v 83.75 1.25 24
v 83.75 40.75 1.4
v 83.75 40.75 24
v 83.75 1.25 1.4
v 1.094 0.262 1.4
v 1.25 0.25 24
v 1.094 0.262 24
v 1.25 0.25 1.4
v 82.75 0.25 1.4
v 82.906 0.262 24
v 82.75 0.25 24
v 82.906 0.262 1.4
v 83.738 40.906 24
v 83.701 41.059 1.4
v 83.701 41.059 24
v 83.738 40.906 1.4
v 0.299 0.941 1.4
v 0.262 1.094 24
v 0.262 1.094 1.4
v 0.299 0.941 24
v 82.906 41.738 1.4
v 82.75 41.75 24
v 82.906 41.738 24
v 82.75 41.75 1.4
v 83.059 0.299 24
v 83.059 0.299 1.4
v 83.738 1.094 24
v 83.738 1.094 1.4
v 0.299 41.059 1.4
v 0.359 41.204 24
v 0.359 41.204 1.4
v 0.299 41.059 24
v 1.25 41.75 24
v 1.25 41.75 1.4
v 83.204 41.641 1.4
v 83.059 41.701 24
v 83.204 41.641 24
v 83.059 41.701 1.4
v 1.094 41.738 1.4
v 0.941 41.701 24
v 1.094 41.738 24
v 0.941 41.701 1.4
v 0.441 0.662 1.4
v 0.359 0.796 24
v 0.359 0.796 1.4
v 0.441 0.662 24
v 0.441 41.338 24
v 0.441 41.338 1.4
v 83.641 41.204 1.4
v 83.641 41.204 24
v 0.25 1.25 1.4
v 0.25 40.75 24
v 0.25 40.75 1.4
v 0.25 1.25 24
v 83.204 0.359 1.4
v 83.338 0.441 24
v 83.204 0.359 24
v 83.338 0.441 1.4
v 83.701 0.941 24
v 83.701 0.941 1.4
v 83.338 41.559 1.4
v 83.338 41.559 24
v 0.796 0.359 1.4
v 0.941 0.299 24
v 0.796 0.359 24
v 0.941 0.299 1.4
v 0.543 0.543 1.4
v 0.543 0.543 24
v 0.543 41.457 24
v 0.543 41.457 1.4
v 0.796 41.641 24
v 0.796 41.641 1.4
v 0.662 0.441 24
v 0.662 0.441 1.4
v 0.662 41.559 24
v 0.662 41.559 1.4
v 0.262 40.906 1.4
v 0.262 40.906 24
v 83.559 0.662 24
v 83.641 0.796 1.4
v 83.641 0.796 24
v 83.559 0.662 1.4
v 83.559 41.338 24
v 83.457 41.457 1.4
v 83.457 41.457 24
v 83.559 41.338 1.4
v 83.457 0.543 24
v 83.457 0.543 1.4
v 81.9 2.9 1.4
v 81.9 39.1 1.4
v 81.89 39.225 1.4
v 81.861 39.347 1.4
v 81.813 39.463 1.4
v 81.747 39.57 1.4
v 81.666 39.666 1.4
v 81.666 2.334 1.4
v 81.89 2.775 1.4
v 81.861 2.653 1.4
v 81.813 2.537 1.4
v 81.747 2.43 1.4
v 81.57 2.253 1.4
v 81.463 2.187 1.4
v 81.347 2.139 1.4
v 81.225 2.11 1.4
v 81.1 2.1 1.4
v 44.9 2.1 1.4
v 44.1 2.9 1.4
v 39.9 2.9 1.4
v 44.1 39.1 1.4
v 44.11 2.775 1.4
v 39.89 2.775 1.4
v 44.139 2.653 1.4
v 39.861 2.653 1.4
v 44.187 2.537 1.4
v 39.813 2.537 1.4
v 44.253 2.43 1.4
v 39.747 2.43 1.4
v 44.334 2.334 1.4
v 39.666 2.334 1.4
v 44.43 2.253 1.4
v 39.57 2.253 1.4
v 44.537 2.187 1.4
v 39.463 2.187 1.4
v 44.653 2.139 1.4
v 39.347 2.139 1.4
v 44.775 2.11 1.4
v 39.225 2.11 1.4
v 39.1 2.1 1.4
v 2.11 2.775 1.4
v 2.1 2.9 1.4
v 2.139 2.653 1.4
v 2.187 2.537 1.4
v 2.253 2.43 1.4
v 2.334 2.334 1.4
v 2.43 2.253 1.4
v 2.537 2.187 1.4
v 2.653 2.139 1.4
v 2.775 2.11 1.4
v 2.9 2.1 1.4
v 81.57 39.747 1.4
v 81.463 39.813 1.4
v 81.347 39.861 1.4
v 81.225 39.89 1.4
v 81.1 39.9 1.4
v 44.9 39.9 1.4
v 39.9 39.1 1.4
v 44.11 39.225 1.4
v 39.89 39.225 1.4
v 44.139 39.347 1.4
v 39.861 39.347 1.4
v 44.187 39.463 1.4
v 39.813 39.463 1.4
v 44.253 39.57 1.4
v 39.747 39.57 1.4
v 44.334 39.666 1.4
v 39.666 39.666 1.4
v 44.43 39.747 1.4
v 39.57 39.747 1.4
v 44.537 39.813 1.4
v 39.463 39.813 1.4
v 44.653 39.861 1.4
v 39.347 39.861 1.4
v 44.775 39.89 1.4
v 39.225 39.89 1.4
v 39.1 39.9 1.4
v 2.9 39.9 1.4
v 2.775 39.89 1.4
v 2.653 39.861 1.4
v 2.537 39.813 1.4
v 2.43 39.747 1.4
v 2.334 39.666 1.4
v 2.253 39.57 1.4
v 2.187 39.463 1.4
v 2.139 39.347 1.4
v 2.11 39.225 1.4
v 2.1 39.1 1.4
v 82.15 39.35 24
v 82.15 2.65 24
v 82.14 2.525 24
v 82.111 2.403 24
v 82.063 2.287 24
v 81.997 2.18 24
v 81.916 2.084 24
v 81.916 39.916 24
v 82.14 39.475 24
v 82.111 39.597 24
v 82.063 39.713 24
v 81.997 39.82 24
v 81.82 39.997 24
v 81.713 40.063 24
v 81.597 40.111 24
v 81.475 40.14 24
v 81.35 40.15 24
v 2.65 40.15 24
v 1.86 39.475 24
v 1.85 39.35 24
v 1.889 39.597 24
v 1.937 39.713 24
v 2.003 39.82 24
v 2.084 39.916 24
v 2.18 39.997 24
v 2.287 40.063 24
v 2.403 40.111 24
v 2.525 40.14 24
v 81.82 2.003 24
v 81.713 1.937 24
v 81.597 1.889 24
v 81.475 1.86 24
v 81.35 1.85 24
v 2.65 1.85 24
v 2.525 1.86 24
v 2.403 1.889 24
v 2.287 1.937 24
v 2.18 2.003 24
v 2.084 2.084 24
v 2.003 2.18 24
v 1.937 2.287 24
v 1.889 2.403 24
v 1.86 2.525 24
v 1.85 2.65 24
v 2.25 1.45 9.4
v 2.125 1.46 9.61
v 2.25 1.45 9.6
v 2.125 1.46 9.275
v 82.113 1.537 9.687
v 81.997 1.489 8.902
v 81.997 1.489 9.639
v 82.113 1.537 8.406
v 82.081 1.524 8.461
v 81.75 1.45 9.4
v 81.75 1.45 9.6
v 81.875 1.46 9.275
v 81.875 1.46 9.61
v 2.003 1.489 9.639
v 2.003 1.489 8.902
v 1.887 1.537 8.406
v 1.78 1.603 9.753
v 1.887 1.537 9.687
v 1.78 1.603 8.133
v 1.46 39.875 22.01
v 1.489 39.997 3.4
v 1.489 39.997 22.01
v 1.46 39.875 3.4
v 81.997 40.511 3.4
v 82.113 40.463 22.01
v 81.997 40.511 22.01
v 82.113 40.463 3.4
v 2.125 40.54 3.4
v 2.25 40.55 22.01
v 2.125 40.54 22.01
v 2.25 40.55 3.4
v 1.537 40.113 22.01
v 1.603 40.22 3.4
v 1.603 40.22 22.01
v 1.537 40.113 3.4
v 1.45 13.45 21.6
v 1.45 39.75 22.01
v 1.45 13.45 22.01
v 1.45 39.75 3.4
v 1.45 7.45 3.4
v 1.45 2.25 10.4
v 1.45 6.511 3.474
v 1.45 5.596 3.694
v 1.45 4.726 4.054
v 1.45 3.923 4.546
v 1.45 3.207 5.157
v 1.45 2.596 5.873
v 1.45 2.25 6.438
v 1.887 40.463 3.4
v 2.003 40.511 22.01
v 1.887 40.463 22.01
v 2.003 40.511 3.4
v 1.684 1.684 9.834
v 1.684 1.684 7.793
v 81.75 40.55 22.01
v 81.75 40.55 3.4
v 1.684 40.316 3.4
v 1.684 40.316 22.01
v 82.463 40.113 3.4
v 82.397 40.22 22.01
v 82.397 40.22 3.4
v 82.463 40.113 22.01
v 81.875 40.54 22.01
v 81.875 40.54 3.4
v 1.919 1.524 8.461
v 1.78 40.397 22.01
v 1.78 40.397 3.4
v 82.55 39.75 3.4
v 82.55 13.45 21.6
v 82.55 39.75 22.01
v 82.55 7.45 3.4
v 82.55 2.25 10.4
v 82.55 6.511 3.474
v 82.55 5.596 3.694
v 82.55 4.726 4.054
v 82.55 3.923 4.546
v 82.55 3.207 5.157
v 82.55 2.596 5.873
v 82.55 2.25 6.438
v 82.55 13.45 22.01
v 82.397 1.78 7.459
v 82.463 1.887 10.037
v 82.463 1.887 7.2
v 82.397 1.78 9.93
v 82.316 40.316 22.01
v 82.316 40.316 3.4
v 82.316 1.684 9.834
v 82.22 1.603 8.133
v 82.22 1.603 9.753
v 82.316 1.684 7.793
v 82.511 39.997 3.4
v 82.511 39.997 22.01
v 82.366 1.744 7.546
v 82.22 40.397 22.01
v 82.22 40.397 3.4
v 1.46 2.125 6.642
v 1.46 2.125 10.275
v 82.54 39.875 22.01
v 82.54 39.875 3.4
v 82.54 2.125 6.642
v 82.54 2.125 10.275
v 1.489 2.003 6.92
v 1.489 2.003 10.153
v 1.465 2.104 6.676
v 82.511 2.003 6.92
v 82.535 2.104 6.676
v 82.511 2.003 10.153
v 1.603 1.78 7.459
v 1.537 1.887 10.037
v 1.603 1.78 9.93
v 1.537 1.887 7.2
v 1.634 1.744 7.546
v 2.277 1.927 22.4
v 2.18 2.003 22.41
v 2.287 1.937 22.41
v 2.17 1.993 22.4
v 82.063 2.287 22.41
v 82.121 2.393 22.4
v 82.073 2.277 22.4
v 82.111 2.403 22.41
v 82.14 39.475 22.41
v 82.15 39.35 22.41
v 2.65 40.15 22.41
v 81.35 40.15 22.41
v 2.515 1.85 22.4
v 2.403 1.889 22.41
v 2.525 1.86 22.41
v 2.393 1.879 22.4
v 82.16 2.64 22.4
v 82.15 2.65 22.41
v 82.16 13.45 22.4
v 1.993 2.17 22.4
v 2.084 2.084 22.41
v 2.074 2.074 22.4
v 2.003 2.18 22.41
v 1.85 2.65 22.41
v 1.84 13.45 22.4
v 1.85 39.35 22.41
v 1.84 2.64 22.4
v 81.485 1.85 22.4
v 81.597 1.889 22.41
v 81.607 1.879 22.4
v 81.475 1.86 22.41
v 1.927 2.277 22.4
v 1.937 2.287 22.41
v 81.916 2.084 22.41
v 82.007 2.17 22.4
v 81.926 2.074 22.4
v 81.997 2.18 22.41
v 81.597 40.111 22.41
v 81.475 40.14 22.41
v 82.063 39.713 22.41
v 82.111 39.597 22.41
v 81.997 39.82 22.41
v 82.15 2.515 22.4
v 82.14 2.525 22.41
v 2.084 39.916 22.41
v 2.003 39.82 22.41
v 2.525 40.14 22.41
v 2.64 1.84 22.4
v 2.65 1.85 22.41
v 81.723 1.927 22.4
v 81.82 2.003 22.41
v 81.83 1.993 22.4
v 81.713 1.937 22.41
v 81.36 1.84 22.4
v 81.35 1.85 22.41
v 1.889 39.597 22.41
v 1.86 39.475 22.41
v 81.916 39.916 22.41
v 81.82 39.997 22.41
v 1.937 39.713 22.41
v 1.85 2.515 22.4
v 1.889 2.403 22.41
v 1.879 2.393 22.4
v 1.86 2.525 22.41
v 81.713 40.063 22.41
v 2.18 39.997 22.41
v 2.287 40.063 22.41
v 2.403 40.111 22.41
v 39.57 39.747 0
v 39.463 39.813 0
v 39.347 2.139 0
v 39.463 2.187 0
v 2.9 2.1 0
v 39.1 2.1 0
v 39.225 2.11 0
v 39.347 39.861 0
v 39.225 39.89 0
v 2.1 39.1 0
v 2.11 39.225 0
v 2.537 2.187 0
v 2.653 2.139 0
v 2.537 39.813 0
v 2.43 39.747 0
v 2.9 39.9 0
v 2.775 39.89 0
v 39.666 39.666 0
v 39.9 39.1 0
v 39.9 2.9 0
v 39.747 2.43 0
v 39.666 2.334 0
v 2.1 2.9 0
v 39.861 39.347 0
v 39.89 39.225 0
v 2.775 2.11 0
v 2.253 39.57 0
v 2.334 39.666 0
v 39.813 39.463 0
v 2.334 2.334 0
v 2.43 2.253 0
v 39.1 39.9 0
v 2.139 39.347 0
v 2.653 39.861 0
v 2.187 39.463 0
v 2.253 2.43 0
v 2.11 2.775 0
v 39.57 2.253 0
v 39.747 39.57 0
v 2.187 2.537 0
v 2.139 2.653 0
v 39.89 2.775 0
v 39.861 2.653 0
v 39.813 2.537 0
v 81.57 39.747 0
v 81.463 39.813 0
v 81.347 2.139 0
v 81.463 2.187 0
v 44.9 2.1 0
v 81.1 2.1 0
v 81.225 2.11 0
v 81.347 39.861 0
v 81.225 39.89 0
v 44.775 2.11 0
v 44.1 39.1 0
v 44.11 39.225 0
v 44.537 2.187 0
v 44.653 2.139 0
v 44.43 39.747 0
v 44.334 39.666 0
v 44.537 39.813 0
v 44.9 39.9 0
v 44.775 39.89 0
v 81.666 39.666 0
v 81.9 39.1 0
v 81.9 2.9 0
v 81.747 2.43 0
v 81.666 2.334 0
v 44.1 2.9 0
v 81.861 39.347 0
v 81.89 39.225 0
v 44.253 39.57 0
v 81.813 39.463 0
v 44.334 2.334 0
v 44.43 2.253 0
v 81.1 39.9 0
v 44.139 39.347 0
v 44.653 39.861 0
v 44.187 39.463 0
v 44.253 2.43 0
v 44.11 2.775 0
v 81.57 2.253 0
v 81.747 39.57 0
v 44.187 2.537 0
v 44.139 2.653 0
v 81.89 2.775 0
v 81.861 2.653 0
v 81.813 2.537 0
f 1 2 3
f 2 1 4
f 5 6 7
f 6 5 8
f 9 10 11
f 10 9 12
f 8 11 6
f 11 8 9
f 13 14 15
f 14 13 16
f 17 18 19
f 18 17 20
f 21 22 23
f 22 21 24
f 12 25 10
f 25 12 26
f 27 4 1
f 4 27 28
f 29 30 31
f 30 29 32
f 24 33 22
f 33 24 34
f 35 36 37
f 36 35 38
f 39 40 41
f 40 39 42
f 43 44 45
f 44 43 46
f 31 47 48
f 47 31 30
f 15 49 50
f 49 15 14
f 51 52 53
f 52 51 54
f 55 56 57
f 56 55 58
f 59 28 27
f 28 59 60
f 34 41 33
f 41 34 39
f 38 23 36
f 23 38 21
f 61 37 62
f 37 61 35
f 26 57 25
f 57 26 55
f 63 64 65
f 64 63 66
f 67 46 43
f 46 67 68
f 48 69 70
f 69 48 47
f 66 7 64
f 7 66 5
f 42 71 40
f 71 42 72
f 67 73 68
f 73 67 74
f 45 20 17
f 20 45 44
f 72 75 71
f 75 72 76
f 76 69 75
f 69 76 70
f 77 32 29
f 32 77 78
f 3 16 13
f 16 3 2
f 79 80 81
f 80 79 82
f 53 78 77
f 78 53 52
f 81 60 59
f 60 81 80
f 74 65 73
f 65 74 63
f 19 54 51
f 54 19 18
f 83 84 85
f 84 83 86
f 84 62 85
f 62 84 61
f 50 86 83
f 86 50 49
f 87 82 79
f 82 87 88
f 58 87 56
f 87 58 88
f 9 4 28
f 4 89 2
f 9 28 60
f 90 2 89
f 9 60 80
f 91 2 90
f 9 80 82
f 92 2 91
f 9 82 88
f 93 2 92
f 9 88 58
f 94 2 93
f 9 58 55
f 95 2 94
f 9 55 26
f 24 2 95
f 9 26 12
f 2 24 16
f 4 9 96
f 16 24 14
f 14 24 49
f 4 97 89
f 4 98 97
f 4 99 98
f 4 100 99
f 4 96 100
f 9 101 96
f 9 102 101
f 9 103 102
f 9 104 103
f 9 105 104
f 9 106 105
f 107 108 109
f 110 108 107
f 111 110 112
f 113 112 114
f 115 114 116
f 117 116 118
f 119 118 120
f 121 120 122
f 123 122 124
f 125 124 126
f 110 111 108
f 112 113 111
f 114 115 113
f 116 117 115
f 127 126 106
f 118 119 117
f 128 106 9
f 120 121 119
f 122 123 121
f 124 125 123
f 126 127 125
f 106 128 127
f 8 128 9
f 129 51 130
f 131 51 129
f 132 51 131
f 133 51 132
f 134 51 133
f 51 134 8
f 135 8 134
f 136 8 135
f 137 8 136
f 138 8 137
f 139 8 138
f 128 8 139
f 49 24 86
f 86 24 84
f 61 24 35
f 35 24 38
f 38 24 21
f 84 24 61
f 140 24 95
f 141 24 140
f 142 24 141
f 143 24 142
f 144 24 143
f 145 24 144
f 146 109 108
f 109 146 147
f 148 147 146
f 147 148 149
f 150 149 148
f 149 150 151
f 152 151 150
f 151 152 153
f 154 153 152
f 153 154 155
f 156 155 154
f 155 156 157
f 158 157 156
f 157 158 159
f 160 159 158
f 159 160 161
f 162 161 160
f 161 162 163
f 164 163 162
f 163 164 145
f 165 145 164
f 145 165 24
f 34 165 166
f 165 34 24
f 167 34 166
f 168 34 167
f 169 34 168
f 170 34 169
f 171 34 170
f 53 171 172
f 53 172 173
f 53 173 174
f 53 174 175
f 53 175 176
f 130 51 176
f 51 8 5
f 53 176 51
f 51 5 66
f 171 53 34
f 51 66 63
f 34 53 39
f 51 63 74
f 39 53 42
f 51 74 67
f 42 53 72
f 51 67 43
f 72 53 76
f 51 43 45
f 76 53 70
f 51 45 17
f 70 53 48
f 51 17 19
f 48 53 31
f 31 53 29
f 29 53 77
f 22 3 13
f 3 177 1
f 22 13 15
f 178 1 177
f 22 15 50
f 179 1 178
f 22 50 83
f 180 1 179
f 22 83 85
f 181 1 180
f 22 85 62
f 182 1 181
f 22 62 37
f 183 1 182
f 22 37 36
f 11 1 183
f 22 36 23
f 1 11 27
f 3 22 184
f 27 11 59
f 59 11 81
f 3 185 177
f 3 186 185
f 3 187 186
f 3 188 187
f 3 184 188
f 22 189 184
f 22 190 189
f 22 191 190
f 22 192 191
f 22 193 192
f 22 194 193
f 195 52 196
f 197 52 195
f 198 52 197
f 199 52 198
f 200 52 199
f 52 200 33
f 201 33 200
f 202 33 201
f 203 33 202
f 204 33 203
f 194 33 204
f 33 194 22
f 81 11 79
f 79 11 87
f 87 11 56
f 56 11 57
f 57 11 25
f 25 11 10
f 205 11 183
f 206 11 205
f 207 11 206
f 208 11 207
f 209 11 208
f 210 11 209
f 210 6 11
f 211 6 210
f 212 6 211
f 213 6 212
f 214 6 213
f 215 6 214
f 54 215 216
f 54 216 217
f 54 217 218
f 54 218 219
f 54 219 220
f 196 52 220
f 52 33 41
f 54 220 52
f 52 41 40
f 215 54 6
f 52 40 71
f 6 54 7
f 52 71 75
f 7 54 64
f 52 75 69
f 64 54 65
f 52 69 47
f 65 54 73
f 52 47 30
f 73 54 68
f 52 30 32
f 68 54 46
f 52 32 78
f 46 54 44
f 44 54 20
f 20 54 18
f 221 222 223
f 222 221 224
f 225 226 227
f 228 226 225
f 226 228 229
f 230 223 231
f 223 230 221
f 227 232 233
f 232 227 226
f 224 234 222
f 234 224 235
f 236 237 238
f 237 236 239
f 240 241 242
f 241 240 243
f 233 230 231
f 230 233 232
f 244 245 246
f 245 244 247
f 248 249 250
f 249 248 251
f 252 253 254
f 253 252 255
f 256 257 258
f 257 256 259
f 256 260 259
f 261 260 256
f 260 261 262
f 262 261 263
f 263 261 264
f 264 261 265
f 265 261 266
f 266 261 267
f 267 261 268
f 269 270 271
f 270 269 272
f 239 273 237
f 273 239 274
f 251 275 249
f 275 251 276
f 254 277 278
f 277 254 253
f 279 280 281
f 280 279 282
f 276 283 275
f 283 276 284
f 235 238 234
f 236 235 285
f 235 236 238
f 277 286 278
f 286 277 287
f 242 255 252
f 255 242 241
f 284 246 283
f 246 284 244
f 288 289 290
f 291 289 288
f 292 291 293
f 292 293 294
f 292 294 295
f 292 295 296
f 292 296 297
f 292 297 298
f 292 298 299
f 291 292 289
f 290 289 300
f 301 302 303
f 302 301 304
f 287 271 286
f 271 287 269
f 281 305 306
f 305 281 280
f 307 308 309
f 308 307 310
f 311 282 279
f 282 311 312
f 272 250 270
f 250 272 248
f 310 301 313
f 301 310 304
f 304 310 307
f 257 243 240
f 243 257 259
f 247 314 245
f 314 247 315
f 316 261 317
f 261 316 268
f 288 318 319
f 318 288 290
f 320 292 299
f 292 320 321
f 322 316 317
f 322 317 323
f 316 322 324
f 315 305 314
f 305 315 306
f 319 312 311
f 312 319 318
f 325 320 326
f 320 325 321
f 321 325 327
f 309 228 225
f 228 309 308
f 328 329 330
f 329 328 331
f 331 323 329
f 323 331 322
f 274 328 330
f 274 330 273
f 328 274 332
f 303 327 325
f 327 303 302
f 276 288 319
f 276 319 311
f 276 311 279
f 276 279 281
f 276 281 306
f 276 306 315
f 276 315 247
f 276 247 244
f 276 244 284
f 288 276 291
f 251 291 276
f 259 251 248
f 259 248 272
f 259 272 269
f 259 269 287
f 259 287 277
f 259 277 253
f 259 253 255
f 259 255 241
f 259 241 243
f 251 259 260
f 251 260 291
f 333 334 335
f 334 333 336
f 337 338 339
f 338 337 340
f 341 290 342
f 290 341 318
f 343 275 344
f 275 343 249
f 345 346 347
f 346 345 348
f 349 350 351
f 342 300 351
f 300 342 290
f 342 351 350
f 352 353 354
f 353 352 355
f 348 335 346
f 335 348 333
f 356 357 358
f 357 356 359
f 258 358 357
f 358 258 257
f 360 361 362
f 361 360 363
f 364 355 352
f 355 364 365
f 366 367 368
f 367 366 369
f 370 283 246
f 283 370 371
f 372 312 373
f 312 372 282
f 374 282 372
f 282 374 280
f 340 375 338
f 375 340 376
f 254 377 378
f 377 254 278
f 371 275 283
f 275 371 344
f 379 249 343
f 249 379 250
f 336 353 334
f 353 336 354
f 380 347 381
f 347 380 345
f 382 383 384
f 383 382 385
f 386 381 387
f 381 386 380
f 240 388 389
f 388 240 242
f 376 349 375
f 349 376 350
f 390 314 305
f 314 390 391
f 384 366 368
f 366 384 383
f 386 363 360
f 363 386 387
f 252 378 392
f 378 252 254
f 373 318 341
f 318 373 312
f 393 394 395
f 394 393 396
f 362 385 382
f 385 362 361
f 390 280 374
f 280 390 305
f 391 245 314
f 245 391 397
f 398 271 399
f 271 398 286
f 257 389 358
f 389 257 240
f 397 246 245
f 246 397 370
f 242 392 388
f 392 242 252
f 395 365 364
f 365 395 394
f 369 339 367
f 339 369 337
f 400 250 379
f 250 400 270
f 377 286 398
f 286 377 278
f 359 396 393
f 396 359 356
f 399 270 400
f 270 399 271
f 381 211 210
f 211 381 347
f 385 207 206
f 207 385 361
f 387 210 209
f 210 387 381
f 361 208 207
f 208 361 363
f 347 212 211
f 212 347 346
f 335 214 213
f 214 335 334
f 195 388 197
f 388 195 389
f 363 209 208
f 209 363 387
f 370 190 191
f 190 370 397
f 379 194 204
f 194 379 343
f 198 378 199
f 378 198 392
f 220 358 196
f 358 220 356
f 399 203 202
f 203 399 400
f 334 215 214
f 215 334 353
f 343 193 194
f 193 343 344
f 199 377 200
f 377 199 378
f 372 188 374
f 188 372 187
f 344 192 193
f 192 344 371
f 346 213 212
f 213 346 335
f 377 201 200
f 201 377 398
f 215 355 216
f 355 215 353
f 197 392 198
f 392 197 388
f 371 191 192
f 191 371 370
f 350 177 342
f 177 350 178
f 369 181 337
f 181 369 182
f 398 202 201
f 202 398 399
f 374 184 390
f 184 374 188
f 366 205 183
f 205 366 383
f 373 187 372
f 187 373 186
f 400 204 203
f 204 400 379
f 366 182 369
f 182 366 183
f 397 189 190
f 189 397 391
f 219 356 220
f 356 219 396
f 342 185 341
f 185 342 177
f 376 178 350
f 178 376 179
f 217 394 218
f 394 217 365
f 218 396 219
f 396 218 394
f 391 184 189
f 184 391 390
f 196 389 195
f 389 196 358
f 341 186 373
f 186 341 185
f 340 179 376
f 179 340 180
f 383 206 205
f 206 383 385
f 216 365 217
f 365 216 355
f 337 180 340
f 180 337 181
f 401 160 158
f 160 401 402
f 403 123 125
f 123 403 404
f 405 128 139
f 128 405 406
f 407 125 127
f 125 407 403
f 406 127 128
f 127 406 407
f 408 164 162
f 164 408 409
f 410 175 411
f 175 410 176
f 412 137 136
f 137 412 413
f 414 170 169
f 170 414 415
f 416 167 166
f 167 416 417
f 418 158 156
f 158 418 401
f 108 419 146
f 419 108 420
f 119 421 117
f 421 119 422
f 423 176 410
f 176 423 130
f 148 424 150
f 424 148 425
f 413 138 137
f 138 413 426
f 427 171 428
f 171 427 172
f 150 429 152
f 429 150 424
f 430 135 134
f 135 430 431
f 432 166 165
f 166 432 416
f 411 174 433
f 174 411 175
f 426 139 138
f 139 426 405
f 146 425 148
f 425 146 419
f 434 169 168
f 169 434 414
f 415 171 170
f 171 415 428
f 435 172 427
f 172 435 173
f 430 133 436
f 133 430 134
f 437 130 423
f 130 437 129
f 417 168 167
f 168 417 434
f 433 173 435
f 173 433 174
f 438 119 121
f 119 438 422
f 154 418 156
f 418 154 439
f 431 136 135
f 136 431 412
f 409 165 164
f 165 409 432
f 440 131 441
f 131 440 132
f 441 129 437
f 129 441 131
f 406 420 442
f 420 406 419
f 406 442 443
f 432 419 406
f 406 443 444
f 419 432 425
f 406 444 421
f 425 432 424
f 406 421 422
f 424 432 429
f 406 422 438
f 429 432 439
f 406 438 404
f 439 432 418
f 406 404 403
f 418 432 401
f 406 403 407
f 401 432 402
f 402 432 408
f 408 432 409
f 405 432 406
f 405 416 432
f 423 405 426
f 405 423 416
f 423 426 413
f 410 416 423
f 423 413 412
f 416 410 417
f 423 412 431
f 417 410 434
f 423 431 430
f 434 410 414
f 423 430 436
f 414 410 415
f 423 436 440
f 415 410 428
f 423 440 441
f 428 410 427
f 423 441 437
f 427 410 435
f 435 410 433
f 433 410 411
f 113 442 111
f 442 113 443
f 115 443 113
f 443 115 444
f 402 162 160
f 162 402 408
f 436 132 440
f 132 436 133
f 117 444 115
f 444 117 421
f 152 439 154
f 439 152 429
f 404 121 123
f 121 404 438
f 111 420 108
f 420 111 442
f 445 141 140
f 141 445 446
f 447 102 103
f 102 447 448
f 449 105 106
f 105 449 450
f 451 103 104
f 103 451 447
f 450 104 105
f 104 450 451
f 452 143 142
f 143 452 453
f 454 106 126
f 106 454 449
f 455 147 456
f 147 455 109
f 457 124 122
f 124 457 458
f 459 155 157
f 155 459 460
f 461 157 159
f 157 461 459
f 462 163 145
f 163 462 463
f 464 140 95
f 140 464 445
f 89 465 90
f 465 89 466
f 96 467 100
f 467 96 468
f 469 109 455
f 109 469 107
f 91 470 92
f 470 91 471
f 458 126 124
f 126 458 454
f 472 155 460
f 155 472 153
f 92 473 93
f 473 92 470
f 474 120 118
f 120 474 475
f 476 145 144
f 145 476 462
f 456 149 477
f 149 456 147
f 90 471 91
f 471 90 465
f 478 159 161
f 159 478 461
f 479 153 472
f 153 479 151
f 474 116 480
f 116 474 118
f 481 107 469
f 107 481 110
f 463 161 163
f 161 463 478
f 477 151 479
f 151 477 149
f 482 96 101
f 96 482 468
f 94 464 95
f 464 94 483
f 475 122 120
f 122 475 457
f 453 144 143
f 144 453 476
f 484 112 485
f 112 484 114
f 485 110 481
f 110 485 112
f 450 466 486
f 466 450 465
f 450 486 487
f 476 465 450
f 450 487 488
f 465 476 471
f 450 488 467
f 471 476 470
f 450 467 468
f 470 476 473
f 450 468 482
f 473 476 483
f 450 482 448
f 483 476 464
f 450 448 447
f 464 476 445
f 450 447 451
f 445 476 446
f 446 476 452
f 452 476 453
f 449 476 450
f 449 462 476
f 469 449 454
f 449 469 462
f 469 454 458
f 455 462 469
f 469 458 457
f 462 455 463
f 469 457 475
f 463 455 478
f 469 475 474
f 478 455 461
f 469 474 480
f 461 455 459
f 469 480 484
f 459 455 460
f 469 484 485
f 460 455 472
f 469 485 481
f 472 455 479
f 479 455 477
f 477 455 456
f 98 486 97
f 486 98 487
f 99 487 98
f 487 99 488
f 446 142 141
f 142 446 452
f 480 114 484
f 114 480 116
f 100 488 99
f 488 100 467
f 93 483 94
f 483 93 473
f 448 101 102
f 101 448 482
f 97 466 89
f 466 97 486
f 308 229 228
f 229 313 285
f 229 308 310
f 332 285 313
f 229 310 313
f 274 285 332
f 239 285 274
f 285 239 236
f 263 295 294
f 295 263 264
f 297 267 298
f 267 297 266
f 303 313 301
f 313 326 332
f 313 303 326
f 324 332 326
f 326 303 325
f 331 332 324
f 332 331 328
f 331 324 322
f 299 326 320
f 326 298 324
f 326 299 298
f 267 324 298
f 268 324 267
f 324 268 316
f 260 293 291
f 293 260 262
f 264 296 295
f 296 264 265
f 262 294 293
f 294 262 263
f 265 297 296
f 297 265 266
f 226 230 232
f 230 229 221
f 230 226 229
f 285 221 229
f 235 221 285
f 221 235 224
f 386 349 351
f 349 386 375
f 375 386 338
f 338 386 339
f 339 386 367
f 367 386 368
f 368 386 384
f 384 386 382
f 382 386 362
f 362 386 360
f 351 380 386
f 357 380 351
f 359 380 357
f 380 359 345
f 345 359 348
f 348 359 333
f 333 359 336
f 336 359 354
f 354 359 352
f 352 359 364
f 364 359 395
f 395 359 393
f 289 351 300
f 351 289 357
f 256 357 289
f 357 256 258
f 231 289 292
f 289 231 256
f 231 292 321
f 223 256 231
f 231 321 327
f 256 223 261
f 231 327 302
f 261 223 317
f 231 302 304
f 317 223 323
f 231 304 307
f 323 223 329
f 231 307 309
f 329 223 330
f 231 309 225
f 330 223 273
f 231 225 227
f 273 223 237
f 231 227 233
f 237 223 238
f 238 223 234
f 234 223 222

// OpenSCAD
// @name Gridfinity Bin
// @description Parametric Gridfinity-compatible storage bins with dividers, front scoop, label lip and stacking lip. Drops into the under-desk drawer's baseplate grid.
// @tags gridfinity, storage, bin, modular, organizer
//
// Companion to gridfinity_drawer.scad: the stepped feet on the underside
// drop into that design's baseplate cells (42mm grid, 38.3mm recess,
// recess floor 0.8mm below the 2.4mm platform top).
//
// Geometry (z=0 at the bottom of the feet):
//   Feet:  one 37.8mm square foot per grid cell (38.3mm recess minus
//          2 x 0.25mm fit clearance), 1.4mm tall so the body underside
//          rests on the platform top while the foot floats 0.2mm above
//          the recess floor.
//   Body:  41.5mm-per-cell footprint (42mm pitch minus 2 x 0.25mm),
//          height_units x 7mm tall, rounded r=1 corners.
//   Lip:   optional 1.6mm stacking lip on top whose inner opening
//          replicates the baseplate recess (body inset 1.6mm, r=0.8),
//          so the feet of another bin drop in with the same clearance.
//   Extras: interior dividers, front scoop fillet, 45-degree-backed
//          label lip along the front top edge.
//
// Stacking: a bin placed at z = height_units*7 + 1.65 above another
// bin's origin seats on its lip (see bin_stack_z()). Seating on a
// baseplate cell puts the bin origin at z = 1.05 (see bin_seat_z()).
//
// Printing:
//   - Print as modeled, standing on the feet ("bin"/"divided" modes).
//   - The 1.85mm underside ring around each foot (and the 4.2mm spans
//     between feet on multi-cell bins) print as short bridges - no
//     supports needed.
//   - Scoop fillet and label lip underside are 45 degrees or shallower.

use <gridfinity_drawer.scad>

/* [Size] */
// Width in Gridfinity units (1 unit = 42mm)
grid_units_x = 2; // [1:1:4]

// Depth in Gridfinity units (1 unit = 42mm)
grid_units_y = 1; // [1:1:4]

// Height in Gridfinity height units (1 unit = 7mm)
height_units = 3; // [2:1:8]

/* [Interior] */
// Dividers across the width (walls perpendicular to x, "divided" mode)
divider_count_x = 2; // [0:1:3]

// Dividers across the depth (walls perpendicular to y, "divided" mode)
divider_count_y = 0; // [0:1:3]

// Front scoop fillet radius (mm) - 0 disables
scoop_radius = 6; // [0:1:12]

// Label lip along the front top edge
label_lip = true;

// Label lip depth into the bin (mm)
label_depth = 12; // [8:1:16]

/* [Stacking] */
// Stacking lip on top (mates with the feet of the bin above)
stacking_lip = true;

/* [Advanced] */
// Wall thickness (mm)
wall = 1.2; // [0.8:0.1:2.4]

// Floor thickness above the feet (mm)
floor_thickness = 2; // [1:0.5:3]

// Divider wall thickness (mm)
divider_thickness = 1.2; // [0.8:0.1:2]

// Foot fit clearance per side against the baseplate recess (mm)
fit_clearance = 0.25; // [0.1:0.05:0.4]

// Resolution
$fn = 40;

/* [Display] */
// What to show
_display_mode = "bin"; // ["bin", "divided", "seated", "stacked"]

// ---- Baseplate interface constants (from gridfinity_drawer.scad's
// baseplate_cell(): platform 41.5 r=1, recess 38.3 r=0.8, recess floor
// at z=0.8, platform top at z=2.4). use<> imports modules, not
// variables, so the numbers are replicated here. ----
_pitch = 42;            // Gridfinity grid pitch
_cell_inset = 0.25;     // body inset per side (41.5 per cell)
_recess = 38.3;         // baseplate recess opening
_recess_floor = 0.8;    // recess floor height inside the cell
_plate_h = 2.4;         // platform top height
_lip_h = 1.6;           // stacking lip height = recess depth (2.4 - 0.8)
_lip_wall = 1.6;        // lip wall width = (41.5 - 38.3) / 2

// ---- Derived dimensions ----
_foot_s = _recess - 2 * fit_clearance;        // foot square (37.8 default)
_foot_h = _lip_h - 0.2;                       // 0.2mm float above recess floor
_body_x = grid_units_x * _pitch - 2 * _cell_inset;
_body_y = grid_units_y * _pitch - 2 * _cell_inset;
_top = _foot_h + height_units * 7;            // wall-top height (z from foot bottom)
_x0 = _cell_inset + wall;                     // interior cavity extents
_y0 = _cell_inset + wall;
_inner_x = _body_x - 2 * wall;
_inner_y = _body_y - 2 * wall;
_floor_top = _foot_h + floor_thickness;
_lip_ov = max(0, _lip_wall - wall);           // lip inward overhang past the wall
_eps = 0.05;                                  // weld sink / display separation

// Seated-on-baseplate z for the bin origin: foot bottom 0.2mm above the
// recess floor puts the body underside on the platform top; +eps keeps
// display/test contact faces separated.
function bin_seat_z() = _recess_floor + 0.2 + _eps;

// Stacked-on-bin z offset: body underside on the lower bin's lip top,
// feet engaged inside its lip opening.
function bin_stack_z(hu = height_units) = hu * 7 + _lip_h + _eps;

// ---- Asserts ----
assert(wall >= 0.8, str("wall = ", wall, "mm is too thin to print (min 0.8)"));
assert(floor_thickness >= 1,
    str("floor_thickness = ", floor_thickness, "mm; need >= 1mm above the feet"));
assert(divider_thickness >= 0.8,
    str("divider_thickness = ", divider_thickness, "mm is too thin (min 0.8)"));
assert(divider_count_x == 0 ||
       (_inner_x - divider_count_x * divider_thickness) / (divider_count_x + 1) >= 6,
    str(divider_count_x, " x-dividers leave compartments under 6mm wide; ",
        "reduce divider_count_x or increase grid_units_x"));
assert(divider_count_y == 0 ||
       (_inner_y - divider_count_y * divider_thickness) / (divider_count_y + 1) >= 6,
    str(divider_count_y, " y-dividers leave compartments under 6mm wide; ",
        "reduce divider_count_y or increase grid_units_y"));
assert(scoop_radius == 0 ||
       scoop_radius <= min(_inner_y / 2, height_units * 7 - floor_thickness),
    str("scoop_radius = ", scoop_radius, "mm does not fit the interior"));
assert(!label_lip || _top - label_depth - 0.85 >= _floor_top + 3,
    str("label lip needs a taller bin: height_units*7 must exceed ",
        label_depth + 0.85 + floor_thickness + 3, "mm"));

// ---- Modules ----

// Rounded-corner square (size vector s, corner radius r), corner at origin
module _bin_rsq(s, r) {
    offset(r = r) offset(r = -r) square(s);
}

// One stepped foot, centered on a cell, welded 0.05 up into the floor
module _bin_foot() {
    translate([-_foot_s / 2, -_foot_s / 2, 0])
        linear_extrude(height = _foot_h + _eps)
            _bin_rsq([_foot_s, _foot_s], 0.8);
}

// The bin. Origin: grid corner at x=y=0 (cells centered on
// (i + 0.5) * 42), z=0 at the bottom of the feet.
module bin(gx = grid_units_x, gy = grid_units_y, hu = height_units,
           divx = divider_count_x, divy = divider_count_y) {
    bx = gx * _pitch - 2 * _cell_inset;
    by = gy * _pitch - 2 * _cell_inset;
    top = _foot_h + hu * 7;
    ix = bx - 2 * wall;   // interior spans
    iy = by - 2 * wall;
    // Straight cavity ends where the lip taper takes over. With a lip
    // but no taper (wall >= lip wall) it hands over to the opening
    // cutter just past the lip base; with no lip it overshoots the top.
    cav_top = !stacking_lip ? top + 0.1
            : _lip_ov > 0.05 ? top - _lip_ov + 0.01
            : top + 0.01;

    union() {
        // Shell: body + stacking lip slab, minus interior cavity
        difference() {
            union() {
                // Body
                translate([_cell_inset, _cell_inset, _foot_h])
                    linear_extrude(height = hu * 7)
                        _bin_rsq([bx, by], 1);
                // Stacking lip slab (opening cut below), sunk into the body
                if (stacking_lip)
                    translate([_cell_inset, _cell_inset, top - _eps])
                        linear_extrude(height = _lip_h + _eps)
                            _bin_rsq([bx, by], 1);
            }

            // Interior cavity, straight walls
            translate([_x0, _y0, _floor_top])
                linear_extrude(height = cav_top - _floor_top)
                    _bin_rsq([ix, iy], 0.8);

            // 45-degree-or-shallower taper from the cavity out to the lip
            // opening, so the lip's inward overhang is self-supporting
            if (stacking_lip && _lip_ov > 0.05)
                hull() {
                    translate([_x0, _y0, top - _lip_ov])
                        linear_extrude(height = 0.01)
                            _bin_rsq([ix, iy], 0.8);
                    translate([_cell_inset + _lip_wall, _cell_inset + _lip_wall, top])
                        linear_extrude(height = 0.01)
                            _bin_rsq([bx - 2 * _lip_wall, by - 2 * _lip_wall], 0.8);
                }

            // Lip opening: replicates the baseplate recess profile so the
            // feet of the bin above drop in (overshoots the lip top)
            if (stacking_lip)
                translate([_cell_inset + _lip_wall, _cell_inset + _lip_wall, top - 0.01])
                    linear_extrude(height = _lip_h + 0.11)
                        _bin_rsq([bx - 2 * _lip_wall, by - 2 * _lip_wall], 0.8);
        }

        // Feet: one per cell
        for (cx = [0 : gx - 1], cy = [0 : gy - 1])
            translate([(cx + 0.5) * _pitch, (cy + 0.5) * _pitch, 0])
                _bin_foot();

        // Front scoop fillet (welded 0.05 into floor and walls)
        if (scoop_radius > 0) {
            r = scoop_radius;
            difference() {
                translate([_x0 - _eps, _y0 - _eps, _floor_top - _eps])
                    cube([ix + 2 * _eps, r + _eps, r + _eps]);
                translate([_x0 - _eps - 0.1, _y0 + r, _floor_top + r])
                    rotate([0, 90, 0])
                        cylinder(r = r, h = ix + 2 * _eps + 0.2);
            }
        }

        // Label lip along the front top edge: flat top, 0.8mm tip,
        // 45-degree underside back to the wall (welded 0.05 in)
        if (label_lip)
            translate([_x0 - _eps, _y0, 0])
                rotate([90, 0, 90])
                    linear_extrude(height = ix + 2 * _eps)
                        polygon([
                            [-_eps, top],
                            [label_depth, top],
                            [label_depth, top - 0.8],
                            [-_eps, top - 0.8 - label_depth - _eps]
                        ]);

        // Dividers (welded 0.05 into floor and side walls)
        if (divx > 0) {
            cw = (ix - divx * divider_thickness) / (divx + 1);
            for (i = [1 : divx])
                translate([_x0 + i * cw + (i - 1) * divider_thickness,
                           _y0 - _eps, _floor_top - _eps])
                    cube([divider_thickness, iy + 2 * _eps,
                          top - _floor_top + _eps]);
        }
        if (divy > 0) {
            cd = (iy - divy * divider_thickness) / (divy + 1);
            for (i = [1 : divy])
                translate([_x0 - _eps,
                           _y0 + i * cd + (i - 1) * divider_thickness,
                           _floor_top - _eps])
                    cube([ix + 2 * _eps, divider_thickness,
                          top - _floor_top + _eps]);
        }
    }
}

// ---- Display ----

// Bin seated in a baseplate grid (cells from gridfinity_drawer.scad,
// welded onto a display plate so the mode is 2 bodies: plate + bin)
module show_seated() {
    translate([0, 0, 1.6]) {   // lift so the plate bottom sits on z=0
        color("SlateGray") union() {
            translate([-3, -3, -1.6])
                cube([grid_units_x * _pitch + 6, grid_units_y * _pitch + 6,
                      1.6 + _eps]);
            baseplate_grid(grid_units_x, grid_units_y);
        }
        color("SteelBlue")
            translate([0, 0, bin_seat_z()])
                bin(divx = 0, divy = 0);
    }
}

// Two bins stacked, the upper bin's feet engaged in the lower bin's lip
module show_stacked() {
    color("SteelBlue")
        bin(divx = 0, divy = 0);
    color("LightSteelBlue")
        translate([0, 0, bin_stack_z()])
            bin(divx = 0, divy = 0);
}

if (_display_mode == "bin") {
    bin(divx = 0, divy = 0);
} else if (_display_mode == "divided") {
    bin();
} else if (_display_mode == "seated") {
    show_seated();
} else if (_display_mode == "stacked") {
    show_stacked();
}
